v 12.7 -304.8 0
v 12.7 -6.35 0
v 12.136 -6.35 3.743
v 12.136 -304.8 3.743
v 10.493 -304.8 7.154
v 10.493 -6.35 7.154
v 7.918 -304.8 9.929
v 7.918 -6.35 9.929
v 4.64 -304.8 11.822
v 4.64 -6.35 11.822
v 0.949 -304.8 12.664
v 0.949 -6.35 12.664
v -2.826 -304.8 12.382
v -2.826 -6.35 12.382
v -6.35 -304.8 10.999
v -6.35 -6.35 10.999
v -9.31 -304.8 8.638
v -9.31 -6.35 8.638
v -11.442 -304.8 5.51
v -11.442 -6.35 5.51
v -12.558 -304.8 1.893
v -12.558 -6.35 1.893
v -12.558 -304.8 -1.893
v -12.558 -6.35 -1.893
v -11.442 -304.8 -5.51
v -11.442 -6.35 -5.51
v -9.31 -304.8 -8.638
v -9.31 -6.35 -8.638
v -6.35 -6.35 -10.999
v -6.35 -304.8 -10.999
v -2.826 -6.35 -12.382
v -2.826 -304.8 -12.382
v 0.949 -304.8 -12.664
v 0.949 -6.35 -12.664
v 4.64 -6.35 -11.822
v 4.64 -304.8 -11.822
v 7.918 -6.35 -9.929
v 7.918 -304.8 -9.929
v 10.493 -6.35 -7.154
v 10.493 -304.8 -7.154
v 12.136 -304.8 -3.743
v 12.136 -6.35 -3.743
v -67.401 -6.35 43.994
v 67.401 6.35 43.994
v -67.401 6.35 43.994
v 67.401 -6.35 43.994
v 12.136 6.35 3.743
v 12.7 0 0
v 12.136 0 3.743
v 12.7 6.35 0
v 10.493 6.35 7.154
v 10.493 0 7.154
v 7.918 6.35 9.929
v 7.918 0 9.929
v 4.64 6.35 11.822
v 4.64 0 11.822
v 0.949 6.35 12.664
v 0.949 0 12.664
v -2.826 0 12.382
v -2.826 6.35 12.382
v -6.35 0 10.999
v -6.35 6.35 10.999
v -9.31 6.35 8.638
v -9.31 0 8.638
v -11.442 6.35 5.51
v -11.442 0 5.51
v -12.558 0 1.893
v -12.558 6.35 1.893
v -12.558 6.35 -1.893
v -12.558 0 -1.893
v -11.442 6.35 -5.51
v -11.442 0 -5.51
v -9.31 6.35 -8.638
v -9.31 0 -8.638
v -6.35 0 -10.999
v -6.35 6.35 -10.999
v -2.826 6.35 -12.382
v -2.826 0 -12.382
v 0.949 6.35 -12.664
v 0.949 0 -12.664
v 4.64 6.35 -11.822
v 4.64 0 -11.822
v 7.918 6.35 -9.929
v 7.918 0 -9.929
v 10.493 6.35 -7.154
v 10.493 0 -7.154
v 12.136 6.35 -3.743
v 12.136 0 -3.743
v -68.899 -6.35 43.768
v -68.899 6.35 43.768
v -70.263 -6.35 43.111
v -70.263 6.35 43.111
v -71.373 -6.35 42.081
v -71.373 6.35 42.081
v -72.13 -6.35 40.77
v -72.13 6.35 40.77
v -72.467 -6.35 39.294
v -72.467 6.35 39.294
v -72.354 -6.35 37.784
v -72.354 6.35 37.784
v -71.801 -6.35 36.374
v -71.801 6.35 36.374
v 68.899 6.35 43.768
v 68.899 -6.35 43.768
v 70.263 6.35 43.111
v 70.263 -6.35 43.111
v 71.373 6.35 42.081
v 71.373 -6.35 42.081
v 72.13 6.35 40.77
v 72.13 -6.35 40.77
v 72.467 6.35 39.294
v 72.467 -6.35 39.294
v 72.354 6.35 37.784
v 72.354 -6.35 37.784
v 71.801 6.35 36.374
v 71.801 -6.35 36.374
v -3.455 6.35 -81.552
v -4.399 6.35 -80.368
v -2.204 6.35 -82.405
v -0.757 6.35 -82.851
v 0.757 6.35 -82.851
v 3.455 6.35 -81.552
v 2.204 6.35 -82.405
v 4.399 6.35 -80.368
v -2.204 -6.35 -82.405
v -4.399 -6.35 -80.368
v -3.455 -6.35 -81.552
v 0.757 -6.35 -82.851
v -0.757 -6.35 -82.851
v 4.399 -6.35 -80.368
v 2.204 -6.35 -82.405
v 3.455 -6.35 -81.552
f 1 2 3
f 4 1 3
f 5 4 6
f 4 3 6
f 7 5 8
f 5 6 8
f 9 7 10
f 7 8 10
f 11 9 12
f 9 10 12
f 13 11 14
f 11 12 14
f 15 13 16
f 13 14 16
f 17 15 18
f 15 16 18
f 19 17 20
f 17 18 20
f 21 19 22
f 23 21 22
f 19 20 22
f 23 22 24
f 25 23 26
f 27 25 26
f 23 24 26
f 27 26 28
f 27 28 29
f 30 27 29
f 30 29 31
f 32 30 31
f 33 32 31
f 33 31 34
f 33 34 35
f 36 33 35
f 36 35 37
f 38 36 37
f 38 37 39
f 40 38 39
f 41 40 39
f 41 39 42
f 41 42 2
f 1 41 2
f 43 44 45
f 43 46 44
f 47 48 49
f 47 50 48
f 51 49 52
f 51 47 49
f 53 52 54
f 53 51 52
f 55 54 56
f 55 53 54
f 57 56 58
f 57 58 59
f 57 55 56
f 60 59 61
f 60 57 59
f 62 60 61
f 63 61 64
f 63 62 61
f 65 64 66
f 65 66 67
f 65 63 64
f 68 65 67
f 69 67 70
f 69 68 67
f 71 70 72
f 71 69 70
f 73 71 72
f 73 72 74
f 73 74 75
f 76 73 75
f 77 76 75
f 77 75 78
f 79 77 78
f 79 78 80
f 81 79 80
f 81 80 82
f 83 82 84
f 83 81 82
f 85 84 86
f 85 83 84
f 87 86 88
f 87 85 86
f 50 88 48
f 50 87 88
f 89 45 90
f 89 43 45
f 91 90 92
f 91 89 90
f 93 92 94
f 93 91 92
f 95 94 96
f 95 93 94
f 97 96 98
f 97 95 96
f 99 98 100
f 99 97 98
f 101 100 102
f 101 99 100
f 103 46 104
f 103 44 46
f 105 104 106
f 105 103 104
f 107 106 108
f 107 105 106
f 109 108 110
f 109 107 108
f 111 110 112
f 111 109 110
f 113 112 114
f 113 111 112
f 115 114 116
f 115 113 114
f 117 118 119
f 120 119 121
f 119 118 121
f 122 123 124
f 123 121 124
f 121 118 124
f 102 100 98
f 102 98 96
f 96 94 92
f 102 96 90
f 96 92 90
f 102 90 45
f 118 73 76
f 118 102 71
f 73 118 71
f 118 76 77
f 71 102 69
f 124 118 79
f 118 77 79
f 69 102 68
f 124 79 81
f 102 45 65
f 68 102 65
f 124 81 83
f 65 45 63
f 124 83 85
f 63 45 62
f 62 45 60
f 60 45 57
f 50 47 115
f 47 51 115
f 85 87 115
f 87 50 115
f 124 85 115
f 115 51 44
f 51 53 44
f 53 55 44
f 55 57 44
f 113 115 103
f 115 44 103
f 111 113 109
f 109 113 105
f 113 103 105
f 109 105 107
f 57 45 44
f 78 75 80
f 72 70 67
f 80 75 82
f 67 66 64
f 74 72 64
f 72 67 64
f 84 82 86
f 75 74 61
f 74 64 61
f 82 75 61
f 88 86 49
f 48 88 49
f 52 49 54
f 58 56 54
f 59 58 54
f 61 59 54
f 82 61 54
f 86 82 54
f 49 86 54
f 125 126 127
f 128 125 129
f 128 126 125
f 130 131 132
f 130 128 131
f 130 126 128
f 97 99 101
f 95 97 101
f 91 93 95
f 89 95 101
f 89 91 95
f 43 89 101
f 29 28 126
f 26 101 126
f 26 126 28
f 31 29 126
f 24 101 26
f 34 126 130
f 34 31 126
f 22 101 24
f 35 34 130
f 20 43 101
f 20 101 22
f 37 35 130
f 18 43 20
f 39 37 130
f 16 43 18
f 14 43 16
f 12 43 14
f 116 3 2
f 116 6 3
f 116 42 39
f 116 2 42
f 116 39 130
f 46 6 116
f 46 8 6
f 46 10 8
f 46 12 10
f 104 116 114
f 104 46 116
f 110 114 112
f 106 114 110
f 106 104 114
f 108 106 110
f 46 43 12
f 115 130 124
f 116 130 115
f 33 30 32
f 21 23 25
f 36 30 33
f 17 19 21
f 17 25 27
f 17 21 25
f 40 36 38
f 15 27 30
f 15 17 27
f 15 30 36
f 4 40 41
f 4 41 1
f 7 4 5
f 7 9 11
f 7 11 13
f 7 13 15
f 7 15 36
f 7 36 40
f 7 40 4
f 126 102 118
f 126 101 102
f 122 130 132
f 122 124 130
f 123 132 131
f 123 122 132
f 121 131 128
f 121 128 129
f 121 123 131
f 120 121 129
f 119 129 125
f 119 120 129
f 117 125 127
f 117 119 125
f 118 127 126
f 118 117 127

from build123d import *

# Parameters (mm, degrees)
F0_R     = 12.7
F1_DEPTH = 6.35
F2_R     = 5.08
F3_DEPTH = 304.8


with BuildPart() as f1:
    # F0 (on Front) → F1 (new body, symmetric)
    with BuildSketch(Plane.XZ):
        Polygon((76.2, 43.994091), (-76.2, 43.994091), (0, -87.988181), align=None)
        Circle(F0_R, mode=Mode.SUBTRACT)
    extrude(amount=F1_DEPTH, both=True)

    # F2
    f2_edges = [f1.edges().sort_by_distance(p)[0] for p in [
        (0, 0, -87.988181),
        (76.2, 0, 43.994091),
        (-76.2, 0, 43.994091),
    ]]
    fillet(f2_edges, radius=F2_R)

    # F0 (on Front) → F3 (join)
    with BuildSketch(Plane.XZ):
        Circle(F0_R)
    extrude(amount=F3_DEPTH)


solid = f1.part
